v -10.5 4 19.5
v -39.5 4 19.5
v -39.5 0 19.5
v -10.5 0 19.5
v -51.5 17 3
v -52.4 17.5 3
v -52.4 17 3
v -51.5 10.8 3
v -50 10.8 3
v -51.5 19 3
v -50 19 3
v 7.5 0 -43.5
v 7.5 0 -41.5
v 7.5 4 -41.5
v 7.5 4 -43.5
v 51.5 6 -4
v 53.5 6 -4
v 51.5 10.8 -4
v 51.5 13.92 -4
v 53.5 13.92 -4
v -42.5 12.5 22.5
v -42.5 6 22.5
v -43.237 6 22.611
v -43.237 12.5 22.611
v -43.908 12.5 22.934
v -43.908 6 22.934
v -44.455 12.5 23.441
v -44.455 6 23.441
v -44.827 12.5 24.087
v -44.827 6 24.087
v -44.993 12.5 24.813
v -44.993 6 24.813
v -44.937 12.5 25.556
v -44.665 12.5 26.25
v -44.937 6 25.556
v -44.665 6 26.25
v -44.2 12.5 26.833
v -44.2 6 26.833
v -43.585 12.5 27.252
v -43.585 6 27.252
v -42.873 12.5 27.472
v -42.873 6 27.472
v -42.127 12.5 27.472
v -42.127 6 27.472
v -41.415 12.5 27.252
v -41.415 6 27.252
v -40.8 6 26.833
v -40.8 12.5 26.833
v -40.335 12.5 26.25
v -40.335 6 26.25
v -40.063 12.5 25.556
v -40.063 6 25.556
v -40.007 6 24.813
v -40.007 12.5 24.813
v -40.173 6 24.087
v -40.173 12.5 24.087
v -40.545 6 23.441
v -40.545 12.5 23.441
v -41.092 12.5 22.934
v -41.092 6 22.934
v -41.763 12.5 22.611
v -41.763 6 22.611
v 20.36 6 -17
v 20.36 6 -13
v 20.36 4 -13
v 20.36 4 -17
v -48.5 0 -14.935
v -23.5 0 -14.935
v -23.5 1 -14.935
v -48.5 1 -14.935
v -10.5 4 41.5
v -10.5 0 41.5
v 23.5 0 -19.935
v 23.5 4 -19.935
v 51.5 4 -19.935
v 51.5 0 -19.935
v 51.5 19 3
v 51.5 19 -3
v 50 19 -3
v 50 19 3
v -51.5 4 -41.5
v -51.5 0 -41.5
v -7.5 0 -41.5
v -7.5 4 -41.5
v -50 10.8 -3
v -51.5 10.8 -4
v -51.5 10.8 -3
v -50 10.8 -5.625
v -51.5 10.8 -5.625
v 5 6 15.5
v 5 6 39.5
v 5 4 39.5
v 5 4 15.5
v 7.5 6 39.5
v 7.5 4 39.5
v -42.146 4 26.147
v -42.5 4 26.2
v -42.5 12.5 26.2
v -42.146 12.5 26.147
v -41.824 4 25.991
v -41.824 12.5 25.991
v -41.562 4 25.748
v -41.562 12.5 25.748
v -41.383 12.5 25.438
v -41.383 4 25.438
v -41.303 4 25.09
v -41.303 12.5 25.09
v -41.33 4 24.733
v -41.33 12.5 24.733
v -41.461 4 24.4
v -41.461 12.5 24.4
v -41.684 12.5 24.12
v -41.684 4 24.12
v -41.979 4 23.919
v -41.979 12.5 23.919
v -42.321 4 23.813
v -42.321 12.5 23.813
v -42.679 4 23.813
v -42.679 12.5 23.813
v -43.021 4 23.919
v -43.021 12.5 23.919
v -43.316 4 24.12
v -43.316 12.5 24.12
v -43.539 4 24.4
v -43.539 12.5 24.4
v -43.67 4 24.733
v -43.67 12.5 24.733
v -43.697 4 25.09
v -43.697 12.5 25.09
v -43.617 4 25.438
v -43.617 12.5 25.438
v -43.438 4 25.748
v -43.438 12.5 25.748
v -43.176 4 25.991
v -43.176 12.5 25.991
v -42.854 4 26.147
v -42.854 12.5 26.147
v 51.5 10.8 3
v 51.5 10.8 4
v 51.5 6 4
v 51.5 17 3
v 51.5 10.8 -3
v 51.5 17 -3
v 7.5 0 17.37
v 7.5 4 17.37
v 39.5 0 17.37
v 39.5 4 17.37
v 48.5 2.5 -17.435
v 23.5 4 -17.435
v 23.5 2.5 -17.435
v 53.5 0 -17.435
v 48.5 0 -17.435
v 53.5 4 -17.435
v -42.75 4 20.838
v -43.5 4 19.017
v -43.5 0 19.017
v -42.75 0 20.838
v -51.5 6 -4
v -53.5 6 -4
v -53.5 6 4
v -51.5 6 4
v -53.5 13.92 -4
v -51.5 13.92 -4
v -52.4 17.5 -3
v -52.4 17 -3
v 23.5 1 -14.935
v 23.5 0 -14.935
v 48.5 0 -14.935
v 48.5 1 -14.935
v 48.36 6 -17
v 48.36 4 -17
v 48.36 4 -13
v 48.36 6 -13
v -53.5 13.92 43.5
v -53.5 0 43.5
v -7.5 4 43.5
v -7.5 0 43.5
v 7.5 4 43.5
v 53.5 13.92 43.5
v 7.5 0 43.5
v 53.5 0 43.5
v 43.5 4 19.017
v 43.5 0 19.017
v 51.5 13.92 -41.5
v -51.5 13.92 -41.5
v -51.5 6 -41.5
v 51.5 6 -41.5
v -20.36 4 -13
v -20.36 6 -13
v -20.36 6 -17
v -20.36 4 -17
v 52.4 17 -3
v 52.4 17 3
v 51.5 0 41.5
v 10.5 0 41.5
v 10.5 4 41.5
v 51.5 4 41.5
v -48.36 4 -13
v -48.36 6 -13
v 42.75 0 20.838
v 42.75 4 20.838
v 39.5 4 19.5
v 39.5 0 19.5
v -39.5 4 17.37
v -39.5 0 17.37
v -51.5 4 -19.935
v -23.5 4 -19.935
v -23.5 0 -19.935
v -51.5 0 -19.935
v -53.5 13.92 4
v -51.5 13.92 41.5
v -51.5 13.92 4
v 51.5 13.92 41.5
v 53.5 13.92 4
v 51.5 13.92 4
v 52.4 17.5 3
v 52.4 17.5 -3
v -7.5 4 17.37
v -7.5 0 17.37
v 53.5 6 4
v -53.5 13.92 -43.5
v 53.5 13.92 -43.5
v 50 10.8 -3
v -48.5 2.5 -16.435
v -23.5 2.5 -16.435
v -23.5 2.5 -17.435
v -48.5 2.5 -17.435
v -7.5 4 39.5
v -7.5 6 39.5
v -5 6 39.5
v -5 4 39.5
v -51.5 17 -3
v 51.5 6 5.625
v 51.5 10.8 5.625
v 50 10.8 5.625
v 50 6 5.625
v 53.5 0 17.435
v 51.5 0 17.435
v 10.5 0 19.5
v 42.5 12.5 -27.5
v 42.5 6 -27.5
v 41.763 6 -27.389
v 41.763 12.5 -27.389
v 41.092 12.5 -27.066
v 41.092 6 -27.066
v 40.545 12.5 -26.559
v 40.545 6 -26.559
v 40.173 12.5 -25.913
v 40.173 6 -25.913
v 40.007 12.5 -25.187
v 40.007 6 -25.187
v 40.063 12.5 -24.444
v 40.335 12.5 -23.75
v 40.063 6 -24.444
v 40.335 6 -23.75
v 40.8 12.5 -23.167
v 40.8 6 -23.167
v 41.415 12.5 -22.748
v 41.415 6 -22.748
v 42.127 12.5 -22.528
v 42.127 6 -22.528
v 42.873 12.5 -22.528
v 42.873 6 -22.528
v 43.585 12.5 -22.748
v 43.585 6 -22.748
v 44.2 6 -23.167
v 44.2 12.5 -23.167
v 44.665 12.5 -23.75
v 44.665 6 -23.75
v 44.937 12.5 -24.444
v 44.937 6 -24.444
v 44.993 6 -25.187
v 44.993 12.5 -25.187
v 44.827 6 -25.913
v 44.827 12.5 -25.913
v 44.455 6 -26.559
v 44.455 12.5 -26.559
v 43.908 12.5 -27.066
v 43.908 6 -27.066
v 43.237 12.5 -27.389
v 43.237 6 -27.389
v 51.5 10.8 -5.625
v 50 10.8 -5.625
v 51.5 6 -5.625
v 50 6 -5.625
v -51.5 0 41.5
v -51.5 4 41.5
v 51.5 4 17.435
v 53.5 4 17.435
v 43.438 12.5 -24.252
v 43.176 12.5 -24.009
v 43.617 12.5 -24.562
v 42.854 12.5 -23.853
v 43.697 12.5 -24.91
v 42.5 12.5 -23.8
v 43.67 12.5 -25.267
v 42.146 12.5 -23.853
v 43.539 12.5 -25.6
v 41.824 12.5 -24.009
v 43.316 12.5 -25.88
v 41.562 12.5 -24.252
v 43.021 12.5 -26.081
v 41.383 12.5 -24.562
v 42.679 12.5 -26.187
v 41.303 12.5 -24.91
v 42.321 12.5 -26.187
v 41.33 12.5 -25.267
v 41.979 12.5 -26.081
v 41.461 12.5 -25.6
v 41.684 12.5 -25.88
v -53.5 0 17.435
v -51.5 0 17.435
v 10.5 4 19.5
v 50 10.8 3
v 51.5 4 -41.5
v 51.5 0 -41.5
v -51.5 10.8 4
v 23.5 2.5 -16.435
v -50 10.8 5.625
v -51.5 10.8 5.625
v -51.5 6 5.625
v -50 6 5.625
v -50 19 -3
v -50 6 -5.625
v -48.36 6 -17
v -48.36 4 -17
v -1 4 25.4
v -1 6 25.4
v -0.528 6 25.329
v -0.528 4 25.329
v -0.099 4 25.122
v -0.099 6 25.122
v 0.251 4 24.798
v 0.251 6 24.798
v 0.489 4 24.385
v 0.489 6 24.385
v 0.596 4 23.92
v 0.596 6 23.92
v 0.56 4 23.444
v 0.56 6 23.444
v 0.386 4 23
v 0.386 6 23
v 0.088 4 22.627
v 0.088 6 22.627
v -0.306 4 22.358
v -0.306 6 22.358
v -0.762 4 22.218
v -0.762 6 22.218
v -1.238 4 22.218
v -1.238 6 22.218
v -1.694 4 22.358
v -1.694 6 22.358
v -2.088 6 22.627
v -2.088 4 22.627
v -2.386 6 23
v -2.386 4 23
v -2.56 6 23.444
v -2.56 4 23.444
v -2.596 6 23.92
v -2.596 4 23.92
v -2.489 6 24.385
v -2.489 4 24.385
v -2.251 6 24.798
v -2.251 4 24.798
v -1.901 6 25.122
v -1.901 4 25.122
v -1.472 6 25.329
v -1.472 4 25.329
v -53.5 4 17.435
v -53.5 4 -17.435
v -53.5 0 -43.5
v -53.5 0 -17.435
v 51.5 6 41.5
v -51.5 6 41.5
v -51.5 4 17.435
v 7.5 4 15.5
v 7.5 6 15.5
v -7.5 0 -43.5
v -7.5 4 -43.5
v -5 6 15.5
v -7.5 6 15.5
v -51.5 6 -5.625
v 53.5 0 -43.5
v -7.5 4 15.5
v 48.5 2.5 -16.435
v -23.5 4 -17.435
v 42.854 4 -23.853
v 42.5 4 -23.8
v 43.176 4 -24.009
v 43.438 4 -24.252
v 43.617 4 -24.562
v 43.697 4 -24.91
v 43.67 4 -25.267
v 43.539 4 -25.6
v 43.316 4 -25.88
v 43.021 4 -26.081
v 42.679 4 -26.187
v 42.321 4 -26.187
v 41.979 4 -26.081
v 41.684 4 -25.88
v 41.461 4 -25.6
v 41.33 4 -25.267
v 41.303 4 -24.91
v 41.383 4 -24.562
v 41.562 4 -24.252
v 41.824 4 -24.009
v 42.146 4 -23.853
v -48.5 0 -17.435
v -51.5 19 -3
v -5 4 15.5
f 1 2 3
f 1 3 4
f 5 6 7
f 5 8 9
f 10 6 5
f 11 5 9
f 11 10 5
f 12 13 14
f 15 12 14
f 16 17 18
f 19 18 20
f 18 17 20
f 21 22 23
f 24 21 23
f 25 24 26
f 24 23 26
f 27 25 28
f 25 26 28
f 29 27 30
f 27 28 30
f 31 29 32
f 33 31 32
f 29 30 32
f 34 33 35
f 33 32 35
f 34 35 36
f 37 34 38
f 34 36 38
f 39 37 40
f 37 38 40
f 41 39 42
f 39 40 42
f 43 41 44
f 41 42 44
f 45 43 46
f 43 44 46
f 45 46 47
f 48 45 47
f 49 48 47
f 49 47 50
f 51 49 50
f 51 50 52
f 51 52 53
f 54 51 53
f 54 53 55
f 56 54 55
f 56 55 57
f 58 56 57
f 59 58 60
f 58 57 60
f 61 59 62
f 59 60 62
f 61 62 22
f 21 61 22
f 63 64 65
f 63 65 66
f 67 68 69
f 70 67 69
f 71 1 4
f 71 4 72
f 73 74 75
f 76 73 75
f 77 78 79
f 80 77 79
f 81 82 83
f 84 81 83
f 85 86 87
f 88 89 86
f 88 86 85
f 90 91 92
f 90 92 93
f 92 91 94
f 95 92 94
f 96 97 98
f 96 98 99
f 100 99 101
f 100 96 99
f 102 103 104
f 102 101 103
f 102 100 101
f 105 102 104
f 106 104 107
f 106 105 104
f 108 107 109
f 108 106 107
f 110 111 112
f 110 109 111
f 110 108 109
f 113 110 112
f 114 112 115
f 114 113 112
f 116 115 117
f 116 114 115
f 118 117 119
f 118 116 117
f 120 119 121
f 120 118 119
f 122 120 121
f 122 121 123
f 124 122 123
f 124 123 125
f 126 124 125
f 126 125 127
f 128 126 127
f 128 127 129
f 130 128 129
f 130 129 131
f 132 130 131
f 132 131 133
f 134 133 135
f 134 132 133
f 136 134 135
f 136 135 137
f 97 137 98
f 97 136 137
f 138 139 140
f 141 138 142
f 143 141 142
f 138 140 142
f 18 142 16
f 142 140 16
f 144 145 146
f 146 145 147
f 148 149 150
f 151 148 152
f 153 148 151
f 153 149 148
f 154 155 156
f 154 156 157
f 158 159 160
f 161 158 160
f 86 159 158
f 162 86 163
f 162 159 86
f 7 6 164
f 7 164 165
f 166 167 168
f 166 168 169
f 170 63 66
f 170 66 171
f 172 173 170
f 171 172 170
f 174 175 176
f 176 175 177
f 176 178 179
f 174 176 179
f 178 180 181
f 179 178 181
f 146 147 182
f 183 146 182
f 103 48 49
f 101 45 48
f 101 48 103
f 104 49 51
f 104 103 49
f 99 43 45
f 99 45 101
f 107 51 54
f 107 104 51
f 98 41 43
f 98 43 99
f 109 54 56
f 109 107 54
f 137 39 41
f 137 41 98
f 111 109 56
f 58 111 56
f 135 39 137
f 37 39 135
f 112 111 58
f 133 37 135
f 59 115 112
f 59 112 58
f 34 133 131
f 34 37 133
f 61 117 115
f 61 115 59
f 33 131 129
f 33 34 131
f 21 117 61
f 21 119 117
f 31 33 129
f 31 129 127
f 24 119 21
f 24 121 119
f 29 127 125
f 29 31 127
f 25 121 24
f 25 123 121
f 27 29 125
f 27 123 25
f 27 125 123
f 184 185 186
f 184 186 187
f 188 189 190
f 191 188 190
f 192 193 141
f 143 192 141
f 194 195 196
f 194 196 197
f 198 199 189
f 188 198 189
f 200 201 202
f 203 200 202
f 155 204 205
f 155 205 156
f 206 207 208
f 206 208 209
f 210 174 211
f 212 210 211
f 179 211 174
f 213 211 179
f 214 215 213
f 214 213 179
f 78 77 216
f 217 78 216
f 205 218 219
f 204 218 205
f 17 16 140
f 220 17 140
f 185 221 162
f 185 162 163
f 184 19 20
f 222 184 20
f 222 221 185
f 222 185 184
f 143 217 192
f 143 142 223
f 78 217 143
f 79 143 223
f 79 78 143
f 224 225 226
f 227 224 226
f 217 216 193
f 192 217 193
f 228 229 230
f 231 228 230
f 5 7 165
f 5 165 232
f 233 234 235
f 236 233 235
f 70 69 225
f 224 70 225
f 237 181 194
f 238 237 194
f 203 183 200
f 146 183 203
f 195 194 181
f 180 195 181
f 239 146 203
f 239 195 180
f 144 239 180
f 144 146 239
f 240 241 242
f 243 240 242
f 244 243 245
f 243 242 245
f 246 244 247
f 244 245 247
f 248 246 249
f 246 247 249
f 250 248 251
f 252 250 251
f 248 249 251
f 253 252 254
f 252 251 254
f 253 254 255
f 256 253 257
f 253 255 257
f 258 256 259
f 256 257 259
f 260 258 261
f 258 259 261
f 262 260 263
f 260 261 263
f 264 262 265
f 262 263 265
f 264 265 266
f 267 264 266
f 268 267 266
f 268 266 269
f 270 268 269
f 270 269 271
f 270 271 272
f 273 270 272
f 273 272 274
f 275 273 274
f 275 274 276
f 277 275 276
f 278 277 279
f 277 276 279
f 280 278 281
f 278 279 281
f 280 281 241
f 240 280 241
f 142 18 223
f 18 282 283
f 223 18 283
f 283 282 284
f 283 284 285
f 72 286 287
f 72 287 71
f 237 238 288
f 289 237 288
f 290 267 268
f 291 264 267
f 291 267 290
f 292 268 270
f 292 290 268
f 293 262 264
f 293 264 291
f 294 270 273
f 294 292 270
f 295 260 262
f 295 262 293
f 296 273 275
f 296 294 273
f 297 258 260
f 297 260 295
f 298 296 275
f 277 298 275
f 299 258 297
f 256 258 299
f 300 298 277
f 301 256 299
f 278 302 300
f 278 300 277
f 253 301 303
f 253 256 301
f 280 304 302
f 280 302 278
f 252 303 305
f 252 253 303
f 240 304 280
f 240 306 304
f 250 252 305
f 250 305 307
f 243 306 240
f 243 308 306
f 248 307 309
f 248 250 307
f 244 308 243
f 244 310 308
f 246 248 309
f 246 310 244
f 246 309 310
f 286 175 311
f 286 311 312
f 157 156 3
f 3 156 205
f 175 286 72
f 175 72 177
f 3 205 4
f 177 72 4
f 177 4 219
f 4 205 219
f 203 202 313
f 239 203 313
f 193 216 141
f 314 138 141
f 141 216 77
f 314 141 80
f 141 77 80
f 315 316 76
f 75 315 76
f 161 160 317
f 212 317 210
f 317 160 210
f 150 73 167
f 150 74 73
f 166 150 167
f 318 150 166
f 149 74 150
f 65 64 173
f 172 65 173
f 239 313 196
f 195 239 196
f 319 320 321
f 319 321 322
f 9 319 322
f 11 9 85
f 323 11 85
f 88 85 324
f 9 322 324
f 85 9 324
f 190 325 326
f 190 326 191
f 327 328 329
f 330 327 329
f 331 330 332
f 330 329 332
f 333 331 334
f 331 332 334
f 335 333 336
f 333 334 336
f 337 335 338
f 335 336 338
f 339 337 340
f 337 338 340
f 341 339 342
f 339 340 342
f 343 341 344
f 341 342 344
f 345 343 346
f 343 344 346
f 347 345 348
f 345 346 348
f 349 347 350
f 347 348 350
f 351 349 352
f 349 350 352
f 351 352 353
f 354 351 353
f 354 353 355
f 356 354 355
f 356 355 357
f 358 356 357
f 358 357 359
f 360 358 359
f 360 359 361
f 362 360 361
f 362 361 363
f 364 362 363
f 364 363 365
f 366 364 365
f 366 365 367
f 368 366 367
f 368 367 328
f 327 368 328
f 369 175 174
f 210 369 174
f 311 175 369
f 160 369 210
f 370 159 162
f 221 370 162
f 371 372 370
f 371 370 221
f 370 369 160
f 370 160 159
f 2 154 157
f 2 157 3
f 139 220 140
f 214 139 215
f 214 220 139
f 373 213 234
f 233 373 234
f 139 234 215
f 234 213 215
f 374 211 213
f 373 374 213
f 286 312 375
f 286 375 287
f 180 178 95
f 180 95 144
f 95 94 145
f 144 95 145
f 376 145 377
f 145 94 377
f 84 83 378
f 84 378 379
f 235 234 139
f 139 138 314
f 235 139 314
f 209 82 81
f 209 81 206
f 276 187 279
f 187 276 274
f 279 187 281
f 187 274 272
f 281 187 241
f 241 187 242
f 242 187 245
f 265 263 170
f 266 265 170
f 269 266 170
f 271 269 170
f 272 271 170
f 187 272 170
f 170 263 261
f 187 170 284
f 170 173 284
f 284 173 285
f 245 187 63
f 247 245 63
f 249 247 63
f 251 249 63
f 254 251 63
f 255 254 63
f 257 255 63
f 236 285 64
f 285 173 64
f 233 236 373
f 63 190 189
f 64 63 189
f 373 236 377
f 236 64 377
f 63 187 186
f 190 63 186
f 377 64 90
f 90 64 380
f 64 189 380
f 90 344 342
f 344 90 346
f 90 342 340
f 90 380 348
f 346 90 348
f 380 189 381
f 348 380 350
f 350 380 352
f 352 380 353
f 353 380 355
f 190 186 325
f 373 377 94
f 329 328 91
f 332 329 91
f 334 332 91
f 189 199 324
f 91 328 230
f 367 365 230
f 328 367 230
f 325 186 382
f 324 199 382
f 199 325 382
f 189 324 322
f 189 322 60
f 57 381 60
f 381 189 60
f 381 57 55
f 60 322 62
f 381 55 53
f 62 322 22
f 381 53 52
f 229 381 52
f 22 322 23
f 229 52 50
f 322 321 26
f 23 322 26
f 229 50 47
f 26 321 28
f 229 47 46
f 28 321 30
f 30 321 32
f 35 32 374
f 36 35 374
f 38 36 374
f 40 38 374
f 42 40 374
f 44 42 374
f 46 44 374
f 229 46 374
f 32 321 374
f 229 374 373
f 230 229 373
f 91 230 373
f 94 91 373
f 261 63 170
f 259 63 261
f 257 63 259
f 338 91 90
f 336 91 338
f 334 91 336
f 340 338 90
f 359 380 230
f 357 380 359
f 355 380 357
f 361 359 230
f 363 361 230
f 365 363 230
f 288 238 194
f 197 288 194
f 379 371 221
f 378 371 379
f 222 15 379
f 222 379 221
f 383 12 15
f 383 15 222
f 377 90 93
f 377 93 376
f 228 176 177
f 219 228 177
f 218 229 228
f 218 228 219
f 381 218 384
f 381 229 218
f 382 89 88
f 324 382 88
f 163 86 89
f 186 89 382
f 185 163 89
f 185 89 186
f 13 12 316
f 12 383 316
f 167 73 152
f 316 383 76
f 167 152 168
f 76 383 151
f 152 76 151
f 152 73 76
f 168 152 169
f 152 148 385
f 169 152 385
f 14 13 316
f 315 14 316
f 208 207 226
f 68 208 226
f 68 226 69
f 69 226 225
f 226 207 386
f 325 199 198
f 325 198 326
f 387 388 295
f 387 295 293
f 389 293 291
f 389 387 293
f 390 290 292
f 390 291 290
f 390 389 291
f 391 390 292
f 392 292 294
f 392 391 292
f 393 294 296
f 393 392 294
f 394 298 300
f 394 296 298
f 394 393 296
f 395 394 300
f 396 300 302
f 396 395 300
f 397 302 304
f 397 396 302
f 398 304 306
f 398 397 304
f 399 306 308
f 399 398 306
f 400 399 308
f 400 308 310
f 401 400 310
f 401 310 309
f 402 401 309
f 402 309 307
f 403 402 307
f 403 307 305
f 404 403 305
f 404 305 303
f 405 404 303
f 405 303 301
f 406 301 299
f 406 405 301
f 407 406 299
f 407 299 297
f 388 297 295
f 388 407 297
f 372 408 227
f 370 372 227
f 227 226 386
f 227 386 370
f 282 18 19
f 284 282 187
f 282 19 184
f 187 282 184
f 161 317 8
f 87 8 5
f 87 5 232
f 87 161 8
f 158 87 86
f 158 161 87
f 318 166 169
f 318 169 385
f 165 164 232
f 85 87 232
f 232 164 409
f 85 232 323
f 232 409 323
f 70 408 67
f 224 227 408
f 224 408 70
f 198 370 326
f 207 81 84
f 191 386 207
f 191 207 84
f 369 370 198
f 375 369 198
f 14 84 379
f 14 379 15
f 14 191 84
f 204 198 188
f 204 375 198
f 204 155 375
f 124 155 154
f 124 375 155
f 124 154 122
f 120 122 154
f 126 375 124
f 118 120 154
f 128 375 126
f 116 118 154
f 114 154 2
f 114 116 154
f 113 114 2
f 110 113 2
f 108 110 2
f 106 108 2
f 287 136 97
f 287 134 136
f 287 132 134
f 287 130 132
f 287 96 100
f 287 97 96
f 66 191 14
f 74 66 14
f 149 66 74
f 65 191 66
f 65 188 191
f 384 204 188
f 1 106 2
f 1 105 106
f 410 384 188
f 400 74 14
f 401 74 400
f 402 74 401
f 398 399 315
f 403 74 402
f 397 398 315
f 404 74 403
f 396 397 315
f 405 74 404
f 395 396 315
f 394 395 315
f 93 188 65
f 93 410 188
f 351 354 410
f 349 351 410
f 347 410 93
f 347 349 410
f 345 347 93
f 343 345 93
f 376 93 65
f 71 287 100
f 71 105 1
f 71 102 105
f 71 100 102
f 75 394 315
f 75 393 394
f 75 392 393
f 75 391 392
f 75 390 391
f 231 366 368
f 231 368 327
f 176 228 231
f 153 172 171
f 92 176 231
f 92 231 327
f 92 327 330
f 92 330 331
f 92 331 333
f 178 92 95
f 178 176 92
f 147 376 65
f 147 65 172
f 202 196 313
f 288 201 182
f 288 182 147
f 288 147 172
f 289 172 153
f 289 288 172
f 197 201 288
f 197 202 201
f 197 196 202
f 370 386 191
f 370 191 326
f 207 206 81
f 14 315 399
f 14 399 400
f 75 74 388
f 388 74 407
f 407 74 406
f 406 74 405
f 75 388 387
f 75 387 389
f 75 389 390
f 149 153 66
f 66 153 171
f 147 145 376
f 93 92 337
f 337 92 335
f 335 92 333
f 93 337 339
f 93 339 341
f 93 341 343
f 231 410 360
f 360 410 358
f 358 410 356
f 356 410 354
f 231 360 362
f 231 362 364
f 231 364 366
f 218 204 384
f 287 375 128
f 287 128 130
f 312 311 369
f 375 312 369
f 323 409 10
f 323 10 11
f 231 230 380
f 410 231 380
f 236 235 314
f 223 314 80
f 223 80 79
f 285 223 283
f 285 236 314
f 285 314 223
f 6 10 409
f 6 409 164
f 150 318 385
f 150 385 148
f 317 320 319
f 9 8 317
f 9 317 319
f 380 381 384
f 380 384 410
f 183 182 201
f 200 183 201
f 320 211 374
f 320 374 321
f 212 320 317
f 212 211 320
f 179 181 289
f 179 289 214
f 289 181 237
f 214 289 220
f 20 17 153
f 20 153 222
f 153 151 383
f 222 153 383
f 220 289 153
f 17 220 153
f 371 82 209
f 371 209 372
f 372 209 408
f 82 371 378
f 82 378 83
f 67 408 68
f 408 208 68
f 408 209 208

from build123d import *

# Parameters (mm, degrees)
SKETCH1_W               = 107
SKETCH1_H               = 87
BOSS_EXTRUDE1_DEPTH     = 13.92
SKETCH2_W               = 103
SKETCH2_H               = 83
CUT_EXTRUDE1_DEPTH      = 7.92
SKETCH3_R               = 2.5
BOSS_EXTRUDE2_DEPTH     = 6.5
CUT_EXTRUDE2_DEPTH      = 70.406241794
CUT_EXTRUDE2_DEPTH_BACK = 4
SKETCH4_R               = 1.2
SKETCH5_W               = 28
SKETCH5_H               = 4
CUT_EXTRUDE3_DEPTH      = 70.406241794
SKETCH6_W               = 2.5
SKETCH6_H               = 24
CUT_EXTRUDE4_DEPTH      = 70.406241794
SKETCH7_R               = 1.6
CUT_EXTRUDE6_DEPTH      = 70.406241794
SKETCH8_W               = 8
SKETCH8_H               = 7.92
CUT_EXTRUDE9_DEPTH      = 4
SKETCH9_W               = 1.5
SKETCH9_H               = 11.25
BOSS_EXTRUDE4_DEPTH     = 4.8
SKETCH10_W              = 1.5
SKETCH10_H              = 6
BOSS_EXTRUDE5_DEPTH     = 8.2
BOSS_EXTRUDE6_DEPTH     = 6
SKETCH12_W              = 103
SKETCH12_H              = 83
CUT_EXTRUDE10_DEPTH     = 4
SKETCH13_W              = 34.87
SKETCH13_H              = 4
CUT_EXTRUDE11_DEPTH     = 118.056610236
SKETCH14_W              = 28
SKETCH14_H              = 2.5
BOSS_EXTRUDE9_DEPTH     = 4
BOSS_EXTRUDE10_DEPTH    = 25
BOSS_EXTRUDE11_DEPTH    = 25
SKETCH16_W              = 15
SKETCH16_H              = 4
CUT_EXTRUDE12_DEPTH     = 104.885754558
BOSS_EXTRUDE12_DEPTH    = 4


with BuildPart() as part:
    # Sketch1 → Boss-Extrude1 (new body)
    with BuildSketch(Plane(origin=(0, 0, 0), x_dir=(1, 0, 0), z_dir=(0, 1, 0))):
        Rectangle(SKETCH1_W, SKETCH1_H)
    extrude(amount=BOSS_EXTRUDE1_DEPTH)

    # Sketch2 → Cut-Extrude1 (cut)
    with BuildSketch(Plane(origin=(0, 13.92, 0), x_dir=(1, 0, 0), z_dir=(0, 1, 0))):
        Rectangle(SKETCH2_W, SKETCH2_H)
    extrude(amount=-CUT_EXTRUDE1_DEPTH, mode=Mode.SUBTRACT)

    # Sketch3 → Boss-Extrude2 (add)
    with BuildSketch(Plane(origin=(0, 6, 0), x_dir=(1, 0, 0), z_dir=(0, 1, 0))):
        with Locations((-42.5, -25)):
            Circle(SKETCH3_R)
        with Locations((42.5, 25)):
            Circle(SKETCH3_R)
    extrude(amount=BOSS_EXTRUDE2_DEPTH)

    # Sketch4 → Cut-Extrude2 (cut, two sides: drawn at the far end of the back side and taken through both)
    with BuildSketch(Plane(origin=(0, 6, 0), x_dir=(1, 0, 0), z_dir=(0, 1, 0)).offset(-CUT_EXTRUDE2_DEPTH_BACK)):
        with Locations((-42.5, -25)):
            Circle(SKETCH4_R)
        with Locations((42.5, 25)):
            Circle(SKETCH4_R)
    extrude(amount=CUT_EXTRUDE2_DEPTH + CUT_EXTRUDE2_DEPTH_BACK, mode=Mode.SUBTRACT)

    # Sketch5 → Cut-Extrude3 (cut, through all)
    with BuildSketch(Plane(origin=(0, 6, 0), x_dir=(1, 0, 0), z_dir=(0, 1, 0))):
        with Locations((-34.36, 15)):
            Rectangle(SKETCH5_W, SKETCH5_H)
        with Locations((34.36, 15)):
            Rectangle(SKETCH5_W, SKETCH5_H)
    extrude(amount=-CUT_EXTRUDE3_DEPTH, mode=Mode.SUBTRACT)

    # Sketch6 → Cut-Extrude4 (cut, through all)
    with BuildSketch(Plane(origin=(0, 6, 0), x_dir=(1, 0, 0), z_dir=(0, 1, 0))):
        with Locations((6.25, -27.5)):
            Rectangle(SKETCH6_W, SKETCH6_H)
        with Locations((-6.25, -27.5)):
            Rectangle(SKETCH6_W, SKETCH6_H)
    extrude(amount=-CUT_EXTRUDE4_DEPTH, mode=Mode.SUBTRACT)

    # Sketch7 → Cut-Extrude6 (cut, through all)
    with BuildSketch(Plane(origin=(0, 6, 0), x_dir=(1, 0, 0), z_dir=(0, 1, 0))):
        with Locations((-1, -23.8)):
            Circle(SKETCH7_R)
    extrude(amount=-CUT_EXTRUDE6_DEPTH, mode=Mode.SUBTRACT)

    # Sketch8 → Cut-Extrude9 (cut)
    with BuildSketch(Plane.ZY.offset(53.5)):
        with Locations((0, 9.96)):
            Rectangle(SKETCH8_W, SKETCH8_H)
    cut_extrude9 = extrude(amount=-CUT_EXTRUDE9_DEPTH, mode=Mode.SUBTRACT)

    # Sketch9 → Boss-Extrude4 (add)
    with BuildSketch(Plane(origin=(0, 6, 0), x_dir=(1, 0, 0), z_dir=(0, 1, 0))):
        with Locations((-50.75, 0)):
            Rectangle(SKETCH9_W, SKETCH9_H)
    boss_extrude4 = extrude(amount=BOSS_EXTRUDE4_DEPTH)

    # Sketch10 → Boss-Extrude5 (add)
    with BuildSketch(Plane(origin=(0, 10.8, 0), x_dir=(1, 0, 0), z_dir=(0, 1, 0))):
        with Locations((-50.75, 0)):
            Rectangle(SKETCH10_W, SKETCH10_H)
    boss_extrude5 = extrude(amount=BOSS_EXTRUDE5_DEPTH)

    # Sketch11 → Boss-Extrude6 (add)
    with BuildSketch(Plane.XY.offset(3)):
        Polygon((-51.5, 19), (-52.4, 17.5), (-52.4, 17), (-51.5, 17), align=None)
    boss_extrude6 = extrude(amount=-BOSS_EXTRUDE6_DEPTH)

    # Mirror2: Cut-Extrude9, Boss-Extrude4, Boss-Extrude5, Boss-Extrude6 across plane
    add(cut_extrude9.mirror(Plane(origin=(0, 0, 0), x_dir=(0, 0, 1), z_dir=(1, 0, 0))), mode=Mode.SUBTRACT)
    add(boss_extrude4.mirror(Plane(origin=(0, 0, 0), x_dir=(0, 0, 1), z_dir=(1, 0, 0))))
    add(boss_extrude5.mirror(Plane(origin=(0, 0, 0), x_dir=(0, 0, 1), z_dir=(1, 0, 0))))
    add(boss_extrude6.mirror(Plane(origin=(0, 0, 0), x_dir=(0, 0, 1), z_dir=(1, 0, 0))))

    # Sketch12 → Cut-Extrude10 (cut)
    with BuildSketch(Plane.XZ):
        Rectangle(SKETCH12_W, SKETCH12_H)
    extrude(amount=-CUT_EXTRUDE10_DEPTH, mode=Mode.SUBTRACT)

    # Sketch13 → Cut-Extrude11 (cut, through all)
    with BuildSketch(Plane.ZY.offset(53.5)):
        with Locations((0, 2)):
            Rectangle(SKETCH13_W, SKETCH13_H)
    cut_extrude11 = extrude(amount=-CUT_EXTRUDE11_DEPTH, mode=Mode.SUBTRACT)

    # Sketch14 → Boss-Extrude9 (add)
    with BuildSketch(Plane(origin=(0, 4, 0), x_dir=(-1, 0, 0), z_dir=(0, -1, 0))):
        with Locations((37.5, 18.685)):
            Rectangle(SKETCH14_W, SKETCH14_H)
    boss_extrude9 = extrude(amount=BOSS_EXTRUDE9_DEPTH)

    # Sketch15 → Boss-Extrude10 (add)
    with BuildSketch(Plane(origin=(-23.5, 0, 0), x_dir=(0, 0, -1), z_dir=(1, 0, 0))):
        Polygon((17.435, 0), (14.935, 0), (14.935, 1), (16.435, 2.5), (17.435, 2.5), align=None)
    boss_extrude10 = extrude(amount=-BOSS_EXTRUDE10_DEPTH)

    # Mirror8: Cut-Extrude11, Boss-Extrude9, Boss-Extrude10 across plane
    add(cut_extrude11.mirror(Plane(origin=(0, 0, 0), x_dir=(0, 0, 1), z_dir=(1, 0, 0))), mode=Mode.SUBTRACT)
    add(boss_extrude9.mirror(Plane(origin=(0, 0, 0), x_dir=(0, 0, 1), z_dir=(1, 0, 0))))
    add(boss_extrude10.mirror(Plane(origin=(0, 0, 0), x_dir=(0, 0, 1), z_dir=(1, 0, 0))))

    # Sketch15<2> → Boss-Extrude11 (add)
    with BuildSketch(Plane(origin=(-23.5, 0, 0), x_dir=(0, 0, -1), z_dir=(1, 0, 0))):
        Polygon((17.435, 0), (14.935, 0), (14.935, 1), (16.435, 2.5), (17.435, 2.5), align=None)
    extrude(amount=-BOSS_EXTRUDE11_DEPTH)

    # Sketch16 → Cut-Extrude12 (cut, through all)
    with BuildSketch(Plane.XY.offset(43.5)):
        with Locations((0, 2)):
            Rectangle(SKETCH16_W, SKETCH16_H)
    cut_extrude12 = extrude(amount=-CUT_EXTRUDE12_DEPTH, mode=Mode.SUBTRACT)

    # Sketch18 → Boss-Extrude12 (add)
    with BuildSketch(Plane(origin=(0, 4, 0), x_dir=(-1, 0, 0), z_dir=(0, -1, 0))):
        Polygon((7.5, -41.5), (7.5, -17.37), (39.5, -17.37), (43.5, -19.017333388), (42.75, -20.838458378), (39.5, -19.5), (10.5, -19.5), (10.5, -41.5), align=None)
    boss_extrude12 = extrude(amount=BOSS_EXTRUDE12_DEPTH)

    # Mirror9: Cut-Extrude12, Boss-Extrude12 across plane
    add(cut_extrude12.mirror(Plane(origin=(0, 0, 0), x_dir=(0, 0, 1), z_dir=(1, 0, 0))), mode=Mode.SUBTRACT)
    add(boss_extrude12.mirror(Plane(origin=(0, 0, 0), x_dir=(0, 0, 1), z_dir=(1, 0, 0))))


solid = part.part
